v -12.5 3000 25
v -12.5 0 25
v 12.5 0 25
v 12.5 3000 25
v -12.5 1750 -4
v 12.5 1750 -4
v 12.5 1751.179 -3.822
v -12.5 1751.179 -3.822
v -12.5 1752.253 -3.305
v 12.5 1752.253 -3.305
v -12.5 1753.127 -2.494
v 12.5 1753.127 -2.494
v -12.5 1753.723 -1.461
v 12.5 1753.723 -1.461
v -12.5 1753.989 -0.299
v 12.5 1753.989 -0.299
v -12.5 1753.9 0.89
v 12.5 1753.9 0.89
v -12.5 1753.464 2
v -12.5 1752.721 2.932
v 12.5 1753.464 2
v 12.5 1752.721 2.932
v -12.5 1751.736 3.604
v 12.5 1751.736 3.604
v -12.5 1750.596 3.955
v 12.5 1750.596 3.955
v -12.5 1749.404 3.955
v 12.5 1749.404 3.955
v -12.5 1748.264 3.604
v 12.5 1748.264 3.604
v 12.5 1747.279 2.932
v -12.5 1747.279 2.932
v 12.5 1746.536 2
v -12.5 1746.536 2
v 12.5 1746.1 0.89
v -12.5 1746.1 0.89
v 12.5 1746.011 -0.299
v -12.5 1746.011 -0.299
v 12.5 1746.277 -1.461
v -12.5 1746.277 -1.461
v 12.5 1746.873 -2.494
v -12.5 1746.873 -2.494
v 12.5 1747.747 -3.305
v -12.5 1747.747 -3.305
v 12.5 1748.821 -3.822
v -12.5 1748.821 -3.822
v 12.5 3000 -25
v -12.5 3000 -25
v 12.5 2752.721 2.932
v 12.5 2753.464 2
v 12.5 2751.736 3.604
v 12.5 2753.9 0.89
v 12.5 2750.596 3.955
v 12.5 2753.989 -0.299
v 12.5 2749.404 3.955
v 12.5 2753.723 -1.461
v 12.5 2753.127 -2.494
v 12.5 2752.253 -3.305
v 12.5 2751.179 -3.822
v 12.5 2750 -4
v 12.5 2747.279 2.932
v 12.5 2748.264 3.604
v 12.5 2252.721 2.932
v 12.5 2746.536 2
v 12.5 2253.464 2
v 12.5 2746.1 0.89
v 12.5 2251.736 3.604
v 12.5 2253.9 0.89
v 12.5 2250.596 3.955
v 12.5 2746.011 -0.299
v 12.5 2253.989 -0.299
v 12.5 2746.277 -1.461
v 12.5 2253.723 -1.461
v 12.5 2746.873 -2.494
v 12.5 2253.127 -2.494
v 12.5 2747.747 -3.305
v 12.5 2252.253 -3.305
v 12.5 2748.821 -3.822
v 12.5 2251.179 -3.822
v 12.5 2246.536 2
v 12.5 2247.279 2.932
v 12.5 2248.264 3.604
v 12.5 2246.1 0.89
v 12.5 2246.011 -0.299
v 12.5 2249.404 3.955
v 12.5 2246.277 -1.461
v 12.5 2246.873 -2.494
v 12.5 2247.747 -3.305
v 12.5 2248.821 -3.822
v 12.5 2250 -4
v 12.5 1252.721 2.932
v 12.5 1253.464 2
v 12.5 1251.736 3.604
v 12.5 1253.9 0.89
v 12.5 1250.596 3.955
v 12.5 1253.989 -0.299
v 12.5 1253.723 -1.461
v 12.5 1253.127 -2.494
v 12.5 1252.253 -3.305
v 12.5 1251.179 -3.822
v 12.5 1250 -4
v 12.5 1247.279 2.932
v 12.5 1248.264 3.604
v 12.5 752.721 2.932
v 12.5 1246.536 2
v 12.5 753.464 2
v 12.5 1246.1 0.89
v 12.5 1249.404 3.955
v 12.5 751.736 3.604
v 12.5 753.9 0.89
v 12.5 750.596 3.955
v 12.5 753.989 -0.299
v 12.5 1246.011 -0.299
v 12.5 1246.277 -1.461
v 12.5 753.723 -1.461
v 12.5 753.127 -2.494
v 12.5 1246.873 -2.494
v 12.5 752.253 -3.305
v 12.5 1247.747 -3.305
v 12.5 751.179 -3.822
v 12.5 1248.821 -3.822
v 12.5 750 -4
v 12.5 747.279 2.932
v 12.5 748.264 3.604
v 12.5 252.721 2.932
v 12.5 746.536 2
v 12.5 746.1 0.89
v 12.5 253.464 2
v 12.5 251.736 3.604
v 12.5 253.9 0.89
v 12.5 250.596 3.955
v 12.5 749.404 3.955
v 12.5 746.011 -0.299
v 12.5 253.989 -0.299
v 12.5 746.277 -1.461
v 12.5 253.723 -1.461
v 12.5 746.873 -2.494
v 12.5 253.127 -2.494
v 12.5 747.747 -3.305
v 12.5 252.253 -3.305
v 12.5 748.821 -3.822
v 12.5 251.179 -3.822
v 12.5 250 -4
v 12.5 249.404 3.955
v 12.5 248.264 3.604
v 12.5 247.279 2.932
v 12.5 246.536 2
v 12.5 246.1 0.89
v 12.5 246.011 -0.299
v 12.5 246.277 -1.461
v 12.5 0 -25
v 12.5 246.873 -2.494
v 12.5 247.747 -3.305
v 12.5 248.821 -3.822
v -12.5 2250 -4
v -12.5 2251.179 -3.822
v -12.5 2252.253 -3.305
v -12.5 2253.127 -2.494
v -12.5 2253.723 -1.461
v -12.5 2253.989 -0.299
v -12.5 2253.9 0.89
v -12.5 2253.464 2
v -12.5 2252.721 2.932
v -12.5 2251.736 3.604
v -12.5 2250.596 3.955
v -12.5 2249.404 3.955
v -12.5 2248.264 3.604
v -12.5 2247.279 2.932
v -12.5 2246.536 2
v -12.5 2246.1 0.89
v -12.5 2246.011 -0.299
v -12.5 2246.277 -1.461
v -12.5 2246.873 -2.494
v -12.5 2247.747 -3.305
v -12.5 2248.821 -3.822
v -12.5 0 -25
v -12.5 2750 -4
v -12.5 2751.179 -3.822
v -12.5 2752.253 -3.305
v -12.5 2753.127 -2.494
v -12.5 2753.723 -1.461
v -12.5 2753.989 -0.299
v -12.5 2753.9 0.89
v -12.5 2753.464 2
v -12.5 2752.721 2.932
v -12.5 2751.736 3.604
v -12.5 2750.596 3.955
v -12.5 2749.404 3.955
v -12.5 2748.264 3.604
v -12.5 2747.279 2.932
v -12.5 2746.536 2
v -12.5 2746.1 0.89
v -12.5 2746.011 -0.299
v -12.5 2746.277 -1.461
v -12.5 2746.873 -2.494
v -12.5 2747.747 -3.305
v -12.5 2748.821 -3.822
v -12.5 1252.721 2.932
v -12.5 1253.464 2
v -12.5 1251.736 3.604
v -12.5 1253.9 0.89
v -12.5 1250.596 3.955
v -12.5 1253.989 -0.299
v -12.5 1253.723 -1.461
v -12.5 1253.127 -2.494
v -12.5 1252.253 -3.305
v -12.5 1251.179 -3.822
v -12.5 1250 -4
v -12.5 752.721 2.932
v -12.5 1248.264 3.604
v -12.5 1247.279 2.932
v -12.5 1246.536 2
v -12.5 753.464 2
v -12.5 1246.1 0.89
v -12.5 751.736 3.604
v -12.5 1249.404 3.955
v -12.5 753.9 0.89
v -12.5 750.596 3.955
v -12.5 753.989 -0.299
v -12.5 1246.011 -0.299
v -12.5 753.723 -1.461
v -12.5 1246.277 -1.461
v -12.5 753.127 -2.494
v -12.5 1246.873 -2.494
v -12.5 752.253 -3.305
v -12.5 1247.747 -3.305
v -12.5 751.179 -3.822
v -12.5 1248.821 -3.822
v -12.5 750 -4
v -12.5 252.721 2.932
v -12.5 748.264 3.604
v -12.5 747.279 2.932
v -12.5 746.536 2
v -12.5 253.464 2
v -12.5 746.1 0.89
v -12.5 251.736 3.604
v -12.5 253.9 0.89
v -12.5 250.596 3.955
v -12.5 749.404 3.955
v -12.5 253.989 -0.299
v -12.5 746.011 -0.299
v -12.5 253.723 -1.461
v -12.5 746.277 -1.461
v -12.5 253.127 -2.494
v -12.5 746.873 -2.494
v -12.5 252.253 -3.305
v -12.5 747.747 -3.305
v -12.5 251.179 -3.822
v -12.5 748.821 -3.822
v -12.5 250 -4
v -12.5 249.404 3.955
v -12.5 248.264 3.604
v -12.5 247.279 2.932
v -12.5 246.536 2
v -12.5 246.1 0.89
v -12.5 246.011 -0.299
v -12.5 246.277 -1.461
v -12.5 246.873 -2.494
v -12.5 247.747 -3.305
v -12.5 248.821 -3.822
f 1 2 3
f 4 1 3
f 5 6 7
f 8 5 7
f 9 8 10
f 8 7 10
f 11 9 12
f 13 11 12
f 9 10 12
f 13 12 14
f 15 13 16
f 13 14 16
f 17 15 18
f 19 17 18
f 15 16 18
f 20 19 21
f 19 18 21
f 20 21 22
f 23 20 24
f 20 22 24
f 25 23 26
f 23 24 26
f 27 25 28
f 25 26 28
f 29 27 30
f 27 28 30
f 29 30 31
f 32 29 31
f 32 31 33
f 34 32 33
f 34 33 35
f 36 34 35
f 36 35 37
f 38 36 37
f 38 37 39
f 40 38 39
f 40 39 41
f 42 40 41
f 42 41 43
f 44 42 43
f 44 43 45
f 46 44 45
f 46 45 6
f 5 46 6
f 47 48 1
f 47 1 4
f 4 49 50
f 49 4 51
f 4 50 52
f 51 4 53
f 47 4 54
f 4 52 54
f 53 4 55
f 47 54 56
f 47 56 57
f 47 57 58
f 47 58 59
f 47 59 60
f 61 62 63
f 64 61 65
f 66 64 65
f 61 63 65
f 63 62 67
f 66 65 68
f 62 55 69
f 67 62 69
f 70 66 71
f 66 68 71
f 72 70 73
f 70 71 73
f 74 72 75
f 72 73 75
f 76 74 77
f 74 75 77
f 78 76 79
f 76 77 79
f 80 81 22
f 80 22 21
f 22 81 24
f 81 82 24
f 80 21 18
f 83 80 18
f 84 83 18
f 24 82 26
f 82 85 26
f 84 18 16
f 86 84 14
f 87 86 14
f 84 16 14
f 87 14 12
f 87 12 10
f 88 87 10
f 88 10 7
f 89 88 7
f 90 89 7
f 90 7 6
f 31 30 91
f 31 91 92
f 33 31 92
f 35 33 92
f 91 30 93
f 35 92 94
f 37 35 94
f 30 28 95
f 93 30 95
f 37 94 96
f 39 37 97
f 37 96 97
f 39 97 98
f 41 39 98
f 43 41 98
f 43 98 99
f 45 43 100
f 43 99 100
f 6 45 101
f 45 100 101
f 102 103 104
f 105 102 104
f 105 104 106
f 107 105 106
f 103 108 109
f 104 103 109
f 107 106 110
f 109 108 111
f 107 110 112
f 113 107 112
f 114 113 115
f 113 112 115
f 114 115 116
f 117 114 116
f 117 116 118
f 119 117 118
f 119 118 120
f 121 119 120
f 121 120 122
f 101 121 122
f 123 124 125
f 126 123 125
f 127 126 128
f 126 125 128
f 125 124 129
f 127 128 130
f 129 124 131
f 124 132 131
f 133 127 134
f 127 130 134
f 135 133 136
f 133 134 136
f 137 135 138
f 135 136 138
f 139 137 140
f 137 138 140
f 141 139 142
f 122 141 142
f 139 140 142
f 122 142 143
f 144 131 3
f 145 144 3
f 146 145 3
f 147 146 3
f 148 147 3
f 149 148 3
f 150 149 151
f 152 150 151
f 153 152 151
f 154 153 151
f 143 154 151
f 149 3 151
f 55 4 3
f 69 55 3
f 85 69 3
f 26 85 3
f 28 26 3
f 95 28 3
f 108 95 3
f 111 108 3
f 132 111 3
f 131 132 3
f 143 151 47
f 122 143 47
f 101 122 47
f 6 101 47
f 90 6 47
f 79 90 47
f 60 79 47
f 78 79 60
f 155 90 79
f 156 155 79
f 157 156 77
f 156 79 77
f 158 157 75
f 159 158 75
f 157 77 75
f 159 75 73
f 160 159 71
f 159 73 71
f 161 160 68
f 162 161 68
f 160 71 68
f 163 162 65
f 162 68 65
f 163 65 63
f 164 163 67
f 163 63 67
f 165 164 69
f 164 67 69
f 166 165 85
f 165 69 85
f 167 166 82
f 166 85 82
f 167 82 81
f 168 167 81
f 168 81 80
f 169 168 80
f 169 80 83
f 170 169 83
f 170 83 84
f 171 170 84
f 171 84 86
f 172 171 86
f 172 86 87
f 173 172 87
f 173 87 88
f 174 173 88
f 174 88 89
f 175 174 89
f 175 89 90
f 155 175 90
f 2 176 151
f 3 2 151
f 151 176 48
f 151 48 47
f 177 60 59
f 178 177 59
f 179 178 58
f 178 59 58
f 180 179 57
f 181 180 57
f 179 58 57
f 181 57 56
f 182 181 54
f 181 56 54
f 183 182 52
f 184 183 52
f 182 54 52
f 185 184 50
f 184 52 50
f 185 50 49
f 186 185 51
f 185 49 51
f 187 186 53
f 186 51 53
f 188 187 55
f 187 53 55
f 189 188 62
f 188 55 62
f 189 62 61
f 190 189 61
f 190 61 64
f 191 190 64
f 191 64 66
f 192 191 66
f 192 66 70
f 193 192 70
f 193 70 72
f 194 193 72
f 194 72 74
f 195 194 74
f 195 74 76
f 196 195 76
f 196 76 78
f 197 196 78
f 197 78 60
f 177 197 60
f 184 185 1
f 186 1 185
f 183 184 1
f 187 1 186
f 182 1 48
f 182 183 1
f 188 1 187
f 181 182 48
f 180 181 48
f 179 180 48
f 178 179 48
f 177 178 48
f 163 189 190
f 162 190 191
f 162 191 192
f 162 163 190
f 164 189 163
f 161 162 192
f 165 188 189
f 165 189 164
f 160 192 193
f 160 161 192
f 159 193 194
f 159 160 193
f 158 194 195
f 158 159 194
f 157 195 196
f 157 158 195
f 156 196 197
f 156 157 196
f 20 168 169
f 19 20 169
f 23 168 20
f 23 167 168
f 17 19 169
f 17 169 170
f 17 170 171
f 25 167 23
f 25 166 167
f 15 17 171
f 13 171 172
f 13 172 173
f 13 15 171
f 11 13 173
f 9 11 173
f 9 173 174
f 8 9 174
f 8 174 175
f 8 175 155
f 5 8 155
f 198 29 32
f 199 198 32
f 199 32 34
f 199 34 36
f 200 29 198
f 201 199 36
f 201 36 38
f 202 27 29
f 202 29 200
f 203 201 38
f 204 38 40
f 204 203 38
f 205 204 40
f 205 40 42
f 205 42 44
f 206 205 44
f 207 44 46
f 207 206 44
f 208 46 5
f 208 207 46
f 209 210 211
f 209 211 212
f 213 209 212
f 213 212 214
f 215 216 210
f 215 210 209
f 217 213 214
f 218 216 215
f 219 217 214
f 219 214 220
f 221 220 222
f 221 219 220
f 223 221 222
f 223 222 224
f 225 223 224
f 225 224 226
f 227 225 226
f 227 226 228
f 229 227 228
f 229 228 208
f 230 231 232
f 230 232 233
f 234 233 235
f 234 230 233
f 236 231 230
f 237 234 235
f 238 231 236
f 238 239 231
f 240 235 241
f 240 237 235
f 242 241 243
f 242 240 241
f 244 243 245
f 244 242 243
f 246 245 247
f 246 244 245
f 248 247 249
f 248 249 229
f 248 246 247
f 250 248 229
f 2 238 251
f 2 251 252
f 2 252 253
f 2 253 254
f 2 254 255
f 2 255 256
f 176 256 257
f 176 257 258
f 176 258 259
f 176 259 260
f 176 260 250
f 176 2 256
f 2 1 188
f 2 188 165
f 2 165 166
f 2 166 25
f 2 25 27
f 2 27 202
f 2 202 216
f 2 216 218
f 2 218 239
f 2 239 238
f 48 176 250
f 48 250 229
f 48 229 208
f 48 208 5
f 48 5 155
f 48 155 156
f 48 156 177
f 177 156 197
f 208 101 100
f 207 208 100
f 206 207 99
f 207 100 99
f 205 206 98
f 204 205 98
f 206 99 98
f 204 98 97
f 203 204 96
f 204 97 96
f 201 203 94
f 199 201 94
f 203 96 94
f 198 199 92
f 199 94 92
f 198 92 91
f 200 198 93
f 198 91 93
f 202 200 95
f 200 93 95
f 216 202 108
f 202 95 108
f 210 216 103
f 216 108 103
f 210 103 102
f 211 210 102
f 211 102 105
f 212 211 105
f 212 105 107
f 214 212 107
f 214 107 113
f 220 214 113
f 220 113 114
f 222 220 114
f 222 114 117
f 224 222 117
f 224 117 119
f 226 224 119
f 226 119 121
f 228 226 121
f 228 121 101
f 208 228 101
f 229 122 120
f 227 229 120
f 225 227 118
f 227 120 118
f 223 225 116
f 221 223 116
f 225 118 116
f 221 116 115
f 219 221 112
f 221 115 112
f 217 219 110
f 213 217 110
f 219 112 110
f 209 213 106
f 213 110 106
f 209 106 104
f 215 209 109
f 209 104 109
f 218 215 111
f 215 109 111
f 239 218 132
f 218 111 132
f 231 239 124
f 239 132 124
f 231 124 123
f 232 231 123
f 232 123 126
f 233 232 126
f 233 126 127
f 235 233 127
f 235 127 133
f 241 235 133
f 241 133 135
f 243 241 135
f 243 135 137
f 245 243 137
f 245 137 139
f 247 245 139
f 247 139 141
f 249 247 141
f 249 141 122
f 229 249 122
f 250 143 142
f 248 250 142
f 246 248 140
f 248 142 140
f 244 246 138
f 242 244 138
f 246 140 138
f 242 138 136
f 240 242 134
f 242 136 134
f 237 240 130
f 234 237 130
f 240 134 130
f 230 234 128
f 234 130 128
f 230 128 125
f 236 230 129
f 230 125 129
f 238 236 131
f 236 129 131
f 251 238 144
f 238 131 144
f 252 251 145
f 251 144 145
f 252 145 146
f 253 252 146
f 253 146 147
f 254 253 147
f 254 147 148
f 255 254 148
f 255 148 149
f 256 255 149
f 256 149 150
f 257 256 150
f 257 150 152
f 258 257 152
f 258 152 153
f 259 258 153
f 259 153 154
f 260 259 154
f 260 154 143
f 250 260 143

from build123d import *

# Parameters (mm, degrees)
SKETCH_1_W          = 25
SKETCH_1_H          = 50
EXTRUDE_1_DEPTH     = 3000
SKETCH_2_R          = 4
CUT_EXTRUDE_1_DEPTH = 100


with BuildPart() as part:
    # Эскиз1 → Бобышка-Вытянуть1 (new body)
    with BuildSketch(Plane(origin=(0, 0, 0), x_dir=(1, 0, 0), z_dir=(0, 1, 0))):
        Rectangle(SKETCH_1_W, SKETCH_1_H)
    extrude(amount=EXTRUDE_1_DEPTH)

    # Эскиз2 → Вырез-Вытянуть1 (cut)
    with BuildSketch(Plane(origin=(12.5, 0, 0), x_dir=(0, 0, -1), z_dir=(1, 0, 0))):
        with Locations((0, 250)):
            Circle(SKETCH_2_R)
        with Locations((0, 750)):
            Circle(SKETCH_2_R)
        with Locations((0, 1250)):
            Circle(SKETCH_2_R)
        with Locations((0, 1750)):
            Circle(SKETCH_2_R)
        with Locations((0, 2750)):
            Circle(SKETCH_2_R)
        with Locations((0, 2250)):
            Circle(SKETCH_2_R)
    extrude(amount=-CUT_EXTRUDE_1_DEPTH, mode=Mode.SUBTRACT)


solid = part.part
